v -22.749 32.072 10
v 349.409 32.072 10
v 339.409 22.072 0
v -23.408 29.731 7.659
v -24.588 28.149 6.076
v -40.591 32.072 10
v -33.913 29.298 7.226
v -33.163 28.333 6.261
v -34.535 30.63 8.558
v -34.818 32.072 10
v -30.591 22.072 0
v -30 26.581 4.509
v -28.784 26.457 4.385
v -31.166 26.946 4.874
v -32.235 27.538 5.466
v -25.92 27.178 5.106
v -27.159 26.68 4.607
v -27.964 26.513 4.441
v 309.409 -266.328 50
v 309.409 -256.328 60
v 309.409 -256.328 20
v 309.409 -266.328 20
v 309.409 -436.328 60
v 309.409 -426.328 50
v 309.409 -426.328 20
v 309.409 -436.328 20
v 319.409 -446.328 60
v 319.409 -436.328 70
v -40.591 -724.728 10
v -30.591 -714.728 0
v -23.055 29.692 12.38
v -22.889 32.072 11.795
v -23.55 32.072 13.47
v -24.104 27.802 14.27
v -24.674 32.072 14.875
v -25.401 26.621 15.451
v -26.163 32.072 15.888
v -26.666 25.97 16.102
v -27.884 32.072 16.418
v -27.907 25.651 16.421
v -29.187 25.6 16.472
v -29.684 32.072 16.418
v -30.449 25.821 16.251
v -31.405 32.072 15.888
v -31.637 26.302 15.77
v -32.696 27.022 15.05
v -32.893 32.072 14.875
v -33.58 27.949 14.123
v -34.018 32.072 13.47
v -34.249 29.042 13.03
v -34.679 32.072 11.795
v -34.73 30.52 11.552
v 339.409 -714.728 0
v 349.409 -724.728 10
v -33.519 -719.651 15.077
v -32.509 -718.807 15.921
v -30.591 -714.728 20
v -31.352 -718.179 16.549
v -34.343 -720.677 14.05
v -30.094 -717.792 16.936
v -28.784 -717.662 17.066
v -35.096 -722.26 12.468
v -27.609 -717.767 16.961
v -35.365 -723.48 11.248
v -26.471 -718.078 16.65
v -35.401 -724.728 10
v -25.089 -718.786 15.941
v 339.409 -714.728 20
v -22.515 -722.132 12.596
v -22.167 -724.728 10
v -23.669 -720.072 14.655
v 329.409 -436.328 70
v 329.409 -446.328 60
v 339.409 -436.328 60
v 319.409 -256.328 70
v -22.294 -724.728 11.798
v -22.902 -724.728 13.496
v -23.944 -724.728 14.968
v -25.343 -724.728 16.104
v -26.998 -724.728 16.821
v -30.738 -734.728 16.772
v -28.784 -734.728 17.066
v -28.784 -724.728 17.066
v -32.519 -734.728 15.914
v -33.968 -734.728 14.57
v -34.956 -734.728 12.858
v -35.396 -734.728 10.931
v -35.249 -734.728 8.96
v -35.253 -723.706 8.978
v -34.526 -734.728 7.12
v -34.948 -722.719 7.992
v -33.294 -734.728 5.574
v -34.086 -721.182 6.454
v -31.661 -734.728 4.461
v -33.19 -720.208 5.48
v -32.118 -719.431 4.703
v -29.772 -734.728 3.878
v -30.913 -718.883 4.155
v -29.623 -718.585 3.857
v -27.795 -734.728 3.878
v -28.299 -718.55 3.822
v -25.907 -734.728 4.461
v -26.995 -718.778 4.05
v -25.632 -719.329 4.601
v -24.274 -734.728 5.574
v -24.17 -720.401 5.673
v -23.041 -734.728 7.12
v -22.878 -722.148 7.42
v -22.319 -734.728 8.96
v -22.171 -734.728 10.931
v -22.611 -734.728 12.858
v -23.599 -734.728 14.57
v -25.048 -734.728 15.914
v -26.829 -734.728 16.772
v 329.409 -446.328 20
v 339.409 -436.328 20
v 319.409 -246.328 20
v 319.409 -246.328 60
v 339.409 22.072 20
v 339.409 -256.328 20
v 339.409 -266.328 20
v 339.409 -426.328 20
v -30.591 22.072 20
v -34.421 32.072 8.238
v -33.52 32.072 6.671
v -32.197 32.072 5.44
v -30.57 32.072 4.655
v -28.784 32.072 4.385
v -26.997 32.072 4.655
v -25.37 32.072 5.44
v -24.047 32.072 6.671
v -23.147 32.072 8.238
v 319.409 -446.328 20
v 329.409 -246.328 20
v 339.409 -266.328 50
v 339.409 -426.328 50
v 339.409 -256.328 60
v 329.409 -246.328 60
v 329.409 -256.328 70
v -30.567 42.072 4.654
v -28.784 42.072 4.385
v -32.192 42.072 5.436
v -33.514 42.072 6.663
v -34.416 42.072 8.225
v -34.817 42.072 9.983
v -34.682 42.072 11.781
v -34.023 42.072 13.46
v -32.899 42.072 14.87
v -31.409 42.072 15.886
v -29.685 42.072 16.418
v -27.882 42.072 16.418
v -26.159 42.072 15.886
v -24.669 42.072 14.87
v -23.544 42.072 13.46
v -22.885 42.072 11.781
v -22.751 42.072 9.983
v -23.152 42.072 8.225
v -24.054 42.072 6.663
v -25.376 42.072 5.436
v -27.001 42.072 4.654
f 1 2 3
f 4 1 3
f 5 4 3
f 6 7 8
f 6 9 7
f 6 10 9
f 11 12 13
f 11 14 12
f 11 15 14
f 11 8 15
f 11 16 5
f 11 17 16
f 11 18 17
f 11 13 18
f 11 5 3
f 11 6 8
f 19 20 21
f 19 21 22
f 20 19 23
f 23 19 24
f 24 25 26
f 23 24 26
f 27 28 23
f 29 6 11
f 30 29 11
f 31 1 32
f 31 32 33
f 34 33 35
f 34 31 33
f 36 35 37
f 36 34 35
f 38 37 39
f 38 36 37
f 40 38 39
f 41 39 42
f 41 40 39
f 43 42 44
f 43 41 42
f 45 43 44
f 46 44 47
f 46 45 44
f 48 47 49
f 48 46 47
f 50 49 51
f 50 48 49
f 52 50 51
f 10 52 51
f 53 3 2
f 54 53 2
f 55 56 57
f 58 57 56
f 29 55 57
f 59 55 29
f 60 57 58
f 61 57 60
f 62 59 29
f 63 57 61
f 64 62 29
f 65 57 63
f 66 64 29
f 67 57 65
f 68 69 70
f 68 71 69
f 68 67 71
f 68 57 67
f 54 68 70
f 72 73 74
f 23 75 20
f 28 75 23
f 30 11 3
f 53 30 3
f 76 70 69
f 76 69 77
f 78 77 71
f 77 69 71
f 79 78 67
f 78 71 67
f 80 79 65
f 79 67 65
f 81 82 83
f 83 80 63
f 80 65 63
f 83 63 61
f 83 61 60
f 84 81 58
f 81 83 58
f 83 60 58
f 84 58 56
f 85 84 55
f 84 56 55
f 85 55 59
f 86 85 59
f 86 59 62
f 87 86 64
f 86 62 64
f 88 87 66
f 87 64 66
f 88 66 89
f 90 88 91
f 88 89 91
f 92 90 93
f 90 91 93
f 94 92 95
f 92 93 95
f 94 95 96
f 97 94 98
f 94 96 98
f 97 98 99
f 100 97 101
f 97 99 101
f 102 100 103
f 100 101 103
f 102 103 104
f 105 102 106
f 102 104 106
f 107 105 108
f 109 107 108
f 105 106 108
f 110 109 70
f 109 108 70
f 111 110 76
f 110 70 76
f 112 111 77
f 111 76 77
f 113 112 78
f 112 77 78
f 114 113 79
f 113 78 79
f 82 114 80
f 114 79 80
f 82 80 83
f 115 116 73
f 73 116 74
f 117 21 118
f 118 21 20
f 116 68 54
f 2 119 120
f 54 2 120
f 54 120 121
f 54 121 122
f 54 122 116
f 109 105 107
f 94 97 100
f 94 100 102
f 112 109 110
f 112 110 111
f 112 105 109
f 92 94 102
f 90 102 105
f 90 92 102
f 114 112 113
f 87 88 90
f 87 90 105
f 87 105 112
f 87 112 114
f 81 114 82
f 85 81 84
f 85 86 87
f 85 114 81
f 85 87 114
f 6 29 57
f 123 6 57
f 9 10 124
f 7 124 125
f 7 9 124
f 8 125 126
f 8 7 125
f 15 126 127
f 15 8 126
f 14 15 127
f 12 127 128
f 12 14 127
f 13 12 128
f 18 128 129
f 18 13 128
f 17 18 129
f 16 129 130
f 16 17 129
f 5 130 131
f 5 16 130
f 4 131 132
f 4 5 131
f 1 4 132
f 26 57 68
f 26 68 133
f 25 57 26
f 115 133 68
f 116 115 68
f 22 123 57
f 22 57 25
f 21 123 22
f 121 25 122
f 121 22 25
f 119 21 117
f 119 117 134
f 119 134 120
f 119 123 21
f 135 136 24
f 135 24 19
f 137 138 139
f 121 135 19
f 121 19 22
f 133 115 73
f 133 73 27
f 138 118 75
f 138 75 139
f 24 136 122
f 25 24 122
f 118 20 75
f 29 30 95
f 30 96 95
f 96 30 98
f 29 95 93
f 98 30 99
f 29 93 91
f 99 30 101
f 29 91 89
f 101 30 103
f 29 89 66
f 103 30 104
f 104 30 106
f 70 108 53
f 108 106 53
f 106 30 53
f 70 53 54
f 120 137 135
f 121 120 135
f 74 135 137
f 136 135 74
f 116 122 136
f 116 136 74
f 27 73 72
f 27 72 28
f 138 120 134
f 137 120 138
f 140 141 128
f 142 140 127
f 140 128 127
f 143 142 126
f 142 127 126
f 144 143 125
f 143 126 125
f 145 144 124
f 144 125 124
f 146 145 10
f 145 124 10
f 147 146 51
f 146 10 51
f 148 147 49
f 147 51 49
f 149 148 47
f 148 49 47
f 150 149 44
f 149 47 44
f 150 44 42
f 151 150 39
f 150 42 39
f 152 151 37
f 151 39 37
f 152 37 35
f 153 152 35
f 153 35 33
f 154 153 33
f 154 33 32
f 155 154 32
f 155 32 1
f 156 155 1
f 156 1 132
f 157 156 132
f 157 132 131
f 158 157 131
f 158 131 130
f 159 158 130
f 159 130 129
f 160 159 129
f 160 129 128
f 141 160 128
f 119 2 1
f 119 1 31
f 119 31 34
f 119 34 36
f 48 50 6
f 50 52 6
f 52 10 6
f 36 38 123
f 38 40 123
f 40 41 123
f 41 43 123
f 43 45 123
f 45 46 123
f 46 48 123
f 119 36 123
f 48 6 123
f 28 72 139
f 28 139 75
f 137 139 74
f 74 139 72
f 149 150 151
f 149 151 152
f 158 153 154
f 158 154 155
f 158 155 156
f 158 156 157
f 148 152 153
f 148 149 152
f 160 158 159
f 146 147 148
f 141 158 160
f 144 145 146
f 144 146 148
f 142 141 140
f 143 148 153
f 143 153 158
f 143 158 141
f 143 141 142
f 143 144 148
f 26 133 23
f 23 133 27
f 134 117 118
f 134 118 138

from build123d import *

# Parameters (mm, degrees)
SKETCH1_W           = 390
SKETCH1_H           = 756.8
BOSS_EXTRUDE1_DEPTH = 20
SKETCH2_R           = 6.05
BOSS_EXTRUDE2_DEPTH = 10
SKETCH3_R           = 6.631048811
BOSS_EXTRUDE3_DEPTH = 10
CHAMFER1_SIZE       = 10
BOSS_EXTRUDE5_DEPTH = 50
SKETCH5_W           = 30
SKETCH5_H           = 160
CUT_EXTRUDE1_DEPTH  = 50
CHAMFER2_SIZE       = 10


with BuildPart() as part:
    # Sketch1 → Boss-Extrude1 (new body)
    with BuildSketch(Plane.XY):
        with Locations((154.409313495, -346.327898551)):
            Rectangle(SKETCH1_W, SKETCH1_H)
    extrude(amount=BOSS_EXTRUDE1_DEPTH)

    # Sketch2 → Boss-Extrude2 (add)
    with BuildSketch(Plane(origin=(0, 32.072101449, 0), x_dir=(1, 0, 0), z_dir=(0, 1, 0))):
        with Locations(Location((-28.78378628, -10.435138004, 0), (0, 0, 90))):
            Circle(SKETCH2_R)
    extrude(amount=BOSS_EXTRUDE2_DEPTH)

    # Sketch3 → Boss-Extrude3 (add)
    with BuildSketch(Plane.XZ.offset(724.727898551)):
        with Locations(Location((-28.78378628, 10.435138004, 0), (0, 0, 90))):
            Circle(SKETCH3_R)
    extrude(amount=BOSS_EXTRUDE3_DEPTH)

    # Chamfer1
    # the kernel refuses this chamfer: 10 mm, written as the material it takes off along each edge
    with BuildSketch(Plane(origin=(-40.590686505, -750.44472843, 20), x_dir=(-0.027495876610586317, 0, -0.9996219169112968), z_dir=(0, 1, 0)), Plane(origin=(349.409313495, 57.788931329, 0), x_dir=(-0.9996219169112968, 0, -0.027495876610586334), z_dir=(0, -1, 0))) as chamfer1_piece_1:
        Polygon((CHAMFER1_SIZE * 0.999621916911, -CHAMFER1_SIZE * 0.0274958766106), (-CHAMFER1_SIZE * 0.0274958766106, -CHAMFER1_SIZE * 0.999621916911), (0, 0), align=None)
    extrude(amount=808.233659759, mode=Mode.SUBTRACT)
    with BuildSketch(Plane(origin=(375.126143374, -724.727898551, 20), x_dir=(0, 0.9996219169112968, 0.02749587661058643), z_dir=(-1, 0, 0))) as chamfer1_piece_2_section:
        Polygon((CHAMFER1_SIZE * 0.999621916911, CHAMFER1_SIZE * 0.0274958766106), (-CHAMFER1_SIZE * 0.0274958766106, CHAMFER1_SIZE * 0.999621916911), (0, 0), align=None)
    chamfer1_piece_2 = extrude(amount=441.433659759, mode=Mode.PRIVATE)
    chamfer1_piece_2 = chamfer1_piece_2 - Plane(origin=(-28.78378628, -721.415314621, 10.435138004), x_dir=(0, 0, 1), z_dir=(0, 1, 0)) * Cylinder(6.631048811, 923, mode=Mode.PRIVATE)
    add(chamfer1_piece_2, mode=Mode.SUBTRACT)
    with BuildSketch(Plane(origin=(349.409313495, 57.788931329, 20), x_dir=(-0.9996219169112968, 0, 0.027495876610586282), z_dir=(0, -1, 0)), Plane(origin=(-40.590686505, -750.44472843, 0), x_dir=(-0.027495876610586317, 0, 0.9996219169112968), z_dir=(0, 1, 0))) as chamfer1_piece_3:
        Polygon((CHAMFER1_SIZE * 0.999621916911, CHAMFER1_SIZE * 0.0274958766106), (-CHAMFER1_SIZE * 0.0274958766106, CHAMFER1_SIZE * 0.999621916911), (0, 0), align=None)
    extrude(amount=808.233659759, mode=Mode.SUBTRACT)
    with BuildSketch(Plane(origin=(-66.307516385, 32.072101449, 20), x_dir=(0, 0.027495876610586317, -0.9996219169112968), z_dir=(1, 0, 0))) as chamfer1_piece_4_section:
        Polygon((CHAMFER1_SIZE * 0.999621916911, -CHAMFER1_SIZE * 0.0274958766106), (-CHAMFER1_SIZE * 0.0274958766106, -CHAMFER1_SIZE * 0.999621916911), (0, 0), align=None)
    chamfer1_piece_4 = extrude(amount=441.433659759, mode=Mode.PRIVATE)
    chamfer1_piece_4 = chamfer1_piece_4 - Plane(origin=(-28.78378628, 28.76135635, 10.435138004), x_dir=(0, 0, -1), z_dir=(0, -1, 0)) * Cylinder(6.05, 923, mode=Mode.PRIVATE)
    add(chamfer1_piece_4, mode=Mode.SUBTRACT)
    with BuildSketch(Plane(origin=(375.126143374, -724.727898551, 0), x_dir=(0, 0.9996219169112968, -0.027495876610586487), z_dir=(-1, 0, 0))) as chamfer1_piece_5_section:
        Polygon((CHAMFER1_SIZE * 0.999621916911, -CHAMFER1_SIZE * 0.0274958766106), (-CHAMFER1_SIZE * 0.0274958766106, -CHAMFER1_SIZE * 0.999621916911), (0, 0), align=None)
    chamfer1_piece_5 = extrude(amount=441.433659759, mode=Mode.PRIVATE)
    chamfer1_piece_5 = chamfer1_piece_5 - Plane(origin=(-28.78378628, -721.416873801, 10.435138004), x_dir=(0, 0, 1), z_dir=(0, 1, 0)) * Cylinder(6.631048811, 923, mode=Mode.PRIVATE)
    add(chamfer1_piece_5, mode=Mode.SUBTRACT)
    with BuildSketch(Plane(origin=(-66.307516385, 32.072101449, 0), x_dir=(0, 0.027495876610586317, 0.9996219169112968), z_dir=(1, 0, 0))) as chamfer1_piece_6_section:
        Polygon((CHAMFER1_SIZE * 0.999621916911, CHAMFER1_SIZE * 0.0274958766106), (-CHAMFER1_SIZE * 0.0274958766106, CHAMFER1_SIZE * 0.999621916911), (0, 0), align=None)
    chamfer1_piece_6 = extrude(amount=441.433659759, mode=Mode.PRIVATE)
    chamfer1_piece_6 = chamfer1_piece_6 - Plane(origin=(-28.78378628, 28.763199232, 10.435138004), x_dir=(0, 0, -1), z_dir=(0, -1, 0)) * Cylinder(6.05, 923, mode=Mode.PRIVATE)
    add(chamfer1_piece_6, mode=Mode.SUBTRACT)

    # Sketch4 → Boss-Extrude5 (add)
    with BuildSketch(Plane.XY.offset(20)):
        Polygon((309.409313495, -346.327898551), (309.409313495, -246.327898551), (339.409313495, -246.327898551), (339.409313495, -446.327898551), (309.409313495, -446.327898551), align=None)
    extrude(amount=BOSS_EXTRUDE5_DEPTH)

    # Sketch5 → Cut-Extrude1 (cut)
    with BuildSketch(Plane(origin=(339.409313495, 0, 0), x_dir=(0, 0, -1), z_dir=(1, 0, 0))):
        with Locations((-35, -346.327898551)):
            Rectangle(SKETCH5_W, SKETCH5_H)
    extrude(amount=-CUT_EXTRUDE1_DEPTH, mode=Mode.SUBTRACT)

    # Chamfer2
    chamfer2_edges = [part.edges().sort_by_distance(p)[0] for p in [
        (309.409313495, -346.327898551, 70),
        (309.409313495, -246.327898551, 45),
        (324.409313495, -446.327898551, 70),
        (309.409313495, -446.327898551, 45),
        (339.409313495, -446.327898551, 45),
        (324.409313495, -246.327898551, 70),
        (339.409313495, -246.327898551, 45),
        (339.409313495, -346.327898551, 70),
    ]]
    chamfer(chamfer2_edges, length=CHAMFER2_SIZE)


solid = part.part
